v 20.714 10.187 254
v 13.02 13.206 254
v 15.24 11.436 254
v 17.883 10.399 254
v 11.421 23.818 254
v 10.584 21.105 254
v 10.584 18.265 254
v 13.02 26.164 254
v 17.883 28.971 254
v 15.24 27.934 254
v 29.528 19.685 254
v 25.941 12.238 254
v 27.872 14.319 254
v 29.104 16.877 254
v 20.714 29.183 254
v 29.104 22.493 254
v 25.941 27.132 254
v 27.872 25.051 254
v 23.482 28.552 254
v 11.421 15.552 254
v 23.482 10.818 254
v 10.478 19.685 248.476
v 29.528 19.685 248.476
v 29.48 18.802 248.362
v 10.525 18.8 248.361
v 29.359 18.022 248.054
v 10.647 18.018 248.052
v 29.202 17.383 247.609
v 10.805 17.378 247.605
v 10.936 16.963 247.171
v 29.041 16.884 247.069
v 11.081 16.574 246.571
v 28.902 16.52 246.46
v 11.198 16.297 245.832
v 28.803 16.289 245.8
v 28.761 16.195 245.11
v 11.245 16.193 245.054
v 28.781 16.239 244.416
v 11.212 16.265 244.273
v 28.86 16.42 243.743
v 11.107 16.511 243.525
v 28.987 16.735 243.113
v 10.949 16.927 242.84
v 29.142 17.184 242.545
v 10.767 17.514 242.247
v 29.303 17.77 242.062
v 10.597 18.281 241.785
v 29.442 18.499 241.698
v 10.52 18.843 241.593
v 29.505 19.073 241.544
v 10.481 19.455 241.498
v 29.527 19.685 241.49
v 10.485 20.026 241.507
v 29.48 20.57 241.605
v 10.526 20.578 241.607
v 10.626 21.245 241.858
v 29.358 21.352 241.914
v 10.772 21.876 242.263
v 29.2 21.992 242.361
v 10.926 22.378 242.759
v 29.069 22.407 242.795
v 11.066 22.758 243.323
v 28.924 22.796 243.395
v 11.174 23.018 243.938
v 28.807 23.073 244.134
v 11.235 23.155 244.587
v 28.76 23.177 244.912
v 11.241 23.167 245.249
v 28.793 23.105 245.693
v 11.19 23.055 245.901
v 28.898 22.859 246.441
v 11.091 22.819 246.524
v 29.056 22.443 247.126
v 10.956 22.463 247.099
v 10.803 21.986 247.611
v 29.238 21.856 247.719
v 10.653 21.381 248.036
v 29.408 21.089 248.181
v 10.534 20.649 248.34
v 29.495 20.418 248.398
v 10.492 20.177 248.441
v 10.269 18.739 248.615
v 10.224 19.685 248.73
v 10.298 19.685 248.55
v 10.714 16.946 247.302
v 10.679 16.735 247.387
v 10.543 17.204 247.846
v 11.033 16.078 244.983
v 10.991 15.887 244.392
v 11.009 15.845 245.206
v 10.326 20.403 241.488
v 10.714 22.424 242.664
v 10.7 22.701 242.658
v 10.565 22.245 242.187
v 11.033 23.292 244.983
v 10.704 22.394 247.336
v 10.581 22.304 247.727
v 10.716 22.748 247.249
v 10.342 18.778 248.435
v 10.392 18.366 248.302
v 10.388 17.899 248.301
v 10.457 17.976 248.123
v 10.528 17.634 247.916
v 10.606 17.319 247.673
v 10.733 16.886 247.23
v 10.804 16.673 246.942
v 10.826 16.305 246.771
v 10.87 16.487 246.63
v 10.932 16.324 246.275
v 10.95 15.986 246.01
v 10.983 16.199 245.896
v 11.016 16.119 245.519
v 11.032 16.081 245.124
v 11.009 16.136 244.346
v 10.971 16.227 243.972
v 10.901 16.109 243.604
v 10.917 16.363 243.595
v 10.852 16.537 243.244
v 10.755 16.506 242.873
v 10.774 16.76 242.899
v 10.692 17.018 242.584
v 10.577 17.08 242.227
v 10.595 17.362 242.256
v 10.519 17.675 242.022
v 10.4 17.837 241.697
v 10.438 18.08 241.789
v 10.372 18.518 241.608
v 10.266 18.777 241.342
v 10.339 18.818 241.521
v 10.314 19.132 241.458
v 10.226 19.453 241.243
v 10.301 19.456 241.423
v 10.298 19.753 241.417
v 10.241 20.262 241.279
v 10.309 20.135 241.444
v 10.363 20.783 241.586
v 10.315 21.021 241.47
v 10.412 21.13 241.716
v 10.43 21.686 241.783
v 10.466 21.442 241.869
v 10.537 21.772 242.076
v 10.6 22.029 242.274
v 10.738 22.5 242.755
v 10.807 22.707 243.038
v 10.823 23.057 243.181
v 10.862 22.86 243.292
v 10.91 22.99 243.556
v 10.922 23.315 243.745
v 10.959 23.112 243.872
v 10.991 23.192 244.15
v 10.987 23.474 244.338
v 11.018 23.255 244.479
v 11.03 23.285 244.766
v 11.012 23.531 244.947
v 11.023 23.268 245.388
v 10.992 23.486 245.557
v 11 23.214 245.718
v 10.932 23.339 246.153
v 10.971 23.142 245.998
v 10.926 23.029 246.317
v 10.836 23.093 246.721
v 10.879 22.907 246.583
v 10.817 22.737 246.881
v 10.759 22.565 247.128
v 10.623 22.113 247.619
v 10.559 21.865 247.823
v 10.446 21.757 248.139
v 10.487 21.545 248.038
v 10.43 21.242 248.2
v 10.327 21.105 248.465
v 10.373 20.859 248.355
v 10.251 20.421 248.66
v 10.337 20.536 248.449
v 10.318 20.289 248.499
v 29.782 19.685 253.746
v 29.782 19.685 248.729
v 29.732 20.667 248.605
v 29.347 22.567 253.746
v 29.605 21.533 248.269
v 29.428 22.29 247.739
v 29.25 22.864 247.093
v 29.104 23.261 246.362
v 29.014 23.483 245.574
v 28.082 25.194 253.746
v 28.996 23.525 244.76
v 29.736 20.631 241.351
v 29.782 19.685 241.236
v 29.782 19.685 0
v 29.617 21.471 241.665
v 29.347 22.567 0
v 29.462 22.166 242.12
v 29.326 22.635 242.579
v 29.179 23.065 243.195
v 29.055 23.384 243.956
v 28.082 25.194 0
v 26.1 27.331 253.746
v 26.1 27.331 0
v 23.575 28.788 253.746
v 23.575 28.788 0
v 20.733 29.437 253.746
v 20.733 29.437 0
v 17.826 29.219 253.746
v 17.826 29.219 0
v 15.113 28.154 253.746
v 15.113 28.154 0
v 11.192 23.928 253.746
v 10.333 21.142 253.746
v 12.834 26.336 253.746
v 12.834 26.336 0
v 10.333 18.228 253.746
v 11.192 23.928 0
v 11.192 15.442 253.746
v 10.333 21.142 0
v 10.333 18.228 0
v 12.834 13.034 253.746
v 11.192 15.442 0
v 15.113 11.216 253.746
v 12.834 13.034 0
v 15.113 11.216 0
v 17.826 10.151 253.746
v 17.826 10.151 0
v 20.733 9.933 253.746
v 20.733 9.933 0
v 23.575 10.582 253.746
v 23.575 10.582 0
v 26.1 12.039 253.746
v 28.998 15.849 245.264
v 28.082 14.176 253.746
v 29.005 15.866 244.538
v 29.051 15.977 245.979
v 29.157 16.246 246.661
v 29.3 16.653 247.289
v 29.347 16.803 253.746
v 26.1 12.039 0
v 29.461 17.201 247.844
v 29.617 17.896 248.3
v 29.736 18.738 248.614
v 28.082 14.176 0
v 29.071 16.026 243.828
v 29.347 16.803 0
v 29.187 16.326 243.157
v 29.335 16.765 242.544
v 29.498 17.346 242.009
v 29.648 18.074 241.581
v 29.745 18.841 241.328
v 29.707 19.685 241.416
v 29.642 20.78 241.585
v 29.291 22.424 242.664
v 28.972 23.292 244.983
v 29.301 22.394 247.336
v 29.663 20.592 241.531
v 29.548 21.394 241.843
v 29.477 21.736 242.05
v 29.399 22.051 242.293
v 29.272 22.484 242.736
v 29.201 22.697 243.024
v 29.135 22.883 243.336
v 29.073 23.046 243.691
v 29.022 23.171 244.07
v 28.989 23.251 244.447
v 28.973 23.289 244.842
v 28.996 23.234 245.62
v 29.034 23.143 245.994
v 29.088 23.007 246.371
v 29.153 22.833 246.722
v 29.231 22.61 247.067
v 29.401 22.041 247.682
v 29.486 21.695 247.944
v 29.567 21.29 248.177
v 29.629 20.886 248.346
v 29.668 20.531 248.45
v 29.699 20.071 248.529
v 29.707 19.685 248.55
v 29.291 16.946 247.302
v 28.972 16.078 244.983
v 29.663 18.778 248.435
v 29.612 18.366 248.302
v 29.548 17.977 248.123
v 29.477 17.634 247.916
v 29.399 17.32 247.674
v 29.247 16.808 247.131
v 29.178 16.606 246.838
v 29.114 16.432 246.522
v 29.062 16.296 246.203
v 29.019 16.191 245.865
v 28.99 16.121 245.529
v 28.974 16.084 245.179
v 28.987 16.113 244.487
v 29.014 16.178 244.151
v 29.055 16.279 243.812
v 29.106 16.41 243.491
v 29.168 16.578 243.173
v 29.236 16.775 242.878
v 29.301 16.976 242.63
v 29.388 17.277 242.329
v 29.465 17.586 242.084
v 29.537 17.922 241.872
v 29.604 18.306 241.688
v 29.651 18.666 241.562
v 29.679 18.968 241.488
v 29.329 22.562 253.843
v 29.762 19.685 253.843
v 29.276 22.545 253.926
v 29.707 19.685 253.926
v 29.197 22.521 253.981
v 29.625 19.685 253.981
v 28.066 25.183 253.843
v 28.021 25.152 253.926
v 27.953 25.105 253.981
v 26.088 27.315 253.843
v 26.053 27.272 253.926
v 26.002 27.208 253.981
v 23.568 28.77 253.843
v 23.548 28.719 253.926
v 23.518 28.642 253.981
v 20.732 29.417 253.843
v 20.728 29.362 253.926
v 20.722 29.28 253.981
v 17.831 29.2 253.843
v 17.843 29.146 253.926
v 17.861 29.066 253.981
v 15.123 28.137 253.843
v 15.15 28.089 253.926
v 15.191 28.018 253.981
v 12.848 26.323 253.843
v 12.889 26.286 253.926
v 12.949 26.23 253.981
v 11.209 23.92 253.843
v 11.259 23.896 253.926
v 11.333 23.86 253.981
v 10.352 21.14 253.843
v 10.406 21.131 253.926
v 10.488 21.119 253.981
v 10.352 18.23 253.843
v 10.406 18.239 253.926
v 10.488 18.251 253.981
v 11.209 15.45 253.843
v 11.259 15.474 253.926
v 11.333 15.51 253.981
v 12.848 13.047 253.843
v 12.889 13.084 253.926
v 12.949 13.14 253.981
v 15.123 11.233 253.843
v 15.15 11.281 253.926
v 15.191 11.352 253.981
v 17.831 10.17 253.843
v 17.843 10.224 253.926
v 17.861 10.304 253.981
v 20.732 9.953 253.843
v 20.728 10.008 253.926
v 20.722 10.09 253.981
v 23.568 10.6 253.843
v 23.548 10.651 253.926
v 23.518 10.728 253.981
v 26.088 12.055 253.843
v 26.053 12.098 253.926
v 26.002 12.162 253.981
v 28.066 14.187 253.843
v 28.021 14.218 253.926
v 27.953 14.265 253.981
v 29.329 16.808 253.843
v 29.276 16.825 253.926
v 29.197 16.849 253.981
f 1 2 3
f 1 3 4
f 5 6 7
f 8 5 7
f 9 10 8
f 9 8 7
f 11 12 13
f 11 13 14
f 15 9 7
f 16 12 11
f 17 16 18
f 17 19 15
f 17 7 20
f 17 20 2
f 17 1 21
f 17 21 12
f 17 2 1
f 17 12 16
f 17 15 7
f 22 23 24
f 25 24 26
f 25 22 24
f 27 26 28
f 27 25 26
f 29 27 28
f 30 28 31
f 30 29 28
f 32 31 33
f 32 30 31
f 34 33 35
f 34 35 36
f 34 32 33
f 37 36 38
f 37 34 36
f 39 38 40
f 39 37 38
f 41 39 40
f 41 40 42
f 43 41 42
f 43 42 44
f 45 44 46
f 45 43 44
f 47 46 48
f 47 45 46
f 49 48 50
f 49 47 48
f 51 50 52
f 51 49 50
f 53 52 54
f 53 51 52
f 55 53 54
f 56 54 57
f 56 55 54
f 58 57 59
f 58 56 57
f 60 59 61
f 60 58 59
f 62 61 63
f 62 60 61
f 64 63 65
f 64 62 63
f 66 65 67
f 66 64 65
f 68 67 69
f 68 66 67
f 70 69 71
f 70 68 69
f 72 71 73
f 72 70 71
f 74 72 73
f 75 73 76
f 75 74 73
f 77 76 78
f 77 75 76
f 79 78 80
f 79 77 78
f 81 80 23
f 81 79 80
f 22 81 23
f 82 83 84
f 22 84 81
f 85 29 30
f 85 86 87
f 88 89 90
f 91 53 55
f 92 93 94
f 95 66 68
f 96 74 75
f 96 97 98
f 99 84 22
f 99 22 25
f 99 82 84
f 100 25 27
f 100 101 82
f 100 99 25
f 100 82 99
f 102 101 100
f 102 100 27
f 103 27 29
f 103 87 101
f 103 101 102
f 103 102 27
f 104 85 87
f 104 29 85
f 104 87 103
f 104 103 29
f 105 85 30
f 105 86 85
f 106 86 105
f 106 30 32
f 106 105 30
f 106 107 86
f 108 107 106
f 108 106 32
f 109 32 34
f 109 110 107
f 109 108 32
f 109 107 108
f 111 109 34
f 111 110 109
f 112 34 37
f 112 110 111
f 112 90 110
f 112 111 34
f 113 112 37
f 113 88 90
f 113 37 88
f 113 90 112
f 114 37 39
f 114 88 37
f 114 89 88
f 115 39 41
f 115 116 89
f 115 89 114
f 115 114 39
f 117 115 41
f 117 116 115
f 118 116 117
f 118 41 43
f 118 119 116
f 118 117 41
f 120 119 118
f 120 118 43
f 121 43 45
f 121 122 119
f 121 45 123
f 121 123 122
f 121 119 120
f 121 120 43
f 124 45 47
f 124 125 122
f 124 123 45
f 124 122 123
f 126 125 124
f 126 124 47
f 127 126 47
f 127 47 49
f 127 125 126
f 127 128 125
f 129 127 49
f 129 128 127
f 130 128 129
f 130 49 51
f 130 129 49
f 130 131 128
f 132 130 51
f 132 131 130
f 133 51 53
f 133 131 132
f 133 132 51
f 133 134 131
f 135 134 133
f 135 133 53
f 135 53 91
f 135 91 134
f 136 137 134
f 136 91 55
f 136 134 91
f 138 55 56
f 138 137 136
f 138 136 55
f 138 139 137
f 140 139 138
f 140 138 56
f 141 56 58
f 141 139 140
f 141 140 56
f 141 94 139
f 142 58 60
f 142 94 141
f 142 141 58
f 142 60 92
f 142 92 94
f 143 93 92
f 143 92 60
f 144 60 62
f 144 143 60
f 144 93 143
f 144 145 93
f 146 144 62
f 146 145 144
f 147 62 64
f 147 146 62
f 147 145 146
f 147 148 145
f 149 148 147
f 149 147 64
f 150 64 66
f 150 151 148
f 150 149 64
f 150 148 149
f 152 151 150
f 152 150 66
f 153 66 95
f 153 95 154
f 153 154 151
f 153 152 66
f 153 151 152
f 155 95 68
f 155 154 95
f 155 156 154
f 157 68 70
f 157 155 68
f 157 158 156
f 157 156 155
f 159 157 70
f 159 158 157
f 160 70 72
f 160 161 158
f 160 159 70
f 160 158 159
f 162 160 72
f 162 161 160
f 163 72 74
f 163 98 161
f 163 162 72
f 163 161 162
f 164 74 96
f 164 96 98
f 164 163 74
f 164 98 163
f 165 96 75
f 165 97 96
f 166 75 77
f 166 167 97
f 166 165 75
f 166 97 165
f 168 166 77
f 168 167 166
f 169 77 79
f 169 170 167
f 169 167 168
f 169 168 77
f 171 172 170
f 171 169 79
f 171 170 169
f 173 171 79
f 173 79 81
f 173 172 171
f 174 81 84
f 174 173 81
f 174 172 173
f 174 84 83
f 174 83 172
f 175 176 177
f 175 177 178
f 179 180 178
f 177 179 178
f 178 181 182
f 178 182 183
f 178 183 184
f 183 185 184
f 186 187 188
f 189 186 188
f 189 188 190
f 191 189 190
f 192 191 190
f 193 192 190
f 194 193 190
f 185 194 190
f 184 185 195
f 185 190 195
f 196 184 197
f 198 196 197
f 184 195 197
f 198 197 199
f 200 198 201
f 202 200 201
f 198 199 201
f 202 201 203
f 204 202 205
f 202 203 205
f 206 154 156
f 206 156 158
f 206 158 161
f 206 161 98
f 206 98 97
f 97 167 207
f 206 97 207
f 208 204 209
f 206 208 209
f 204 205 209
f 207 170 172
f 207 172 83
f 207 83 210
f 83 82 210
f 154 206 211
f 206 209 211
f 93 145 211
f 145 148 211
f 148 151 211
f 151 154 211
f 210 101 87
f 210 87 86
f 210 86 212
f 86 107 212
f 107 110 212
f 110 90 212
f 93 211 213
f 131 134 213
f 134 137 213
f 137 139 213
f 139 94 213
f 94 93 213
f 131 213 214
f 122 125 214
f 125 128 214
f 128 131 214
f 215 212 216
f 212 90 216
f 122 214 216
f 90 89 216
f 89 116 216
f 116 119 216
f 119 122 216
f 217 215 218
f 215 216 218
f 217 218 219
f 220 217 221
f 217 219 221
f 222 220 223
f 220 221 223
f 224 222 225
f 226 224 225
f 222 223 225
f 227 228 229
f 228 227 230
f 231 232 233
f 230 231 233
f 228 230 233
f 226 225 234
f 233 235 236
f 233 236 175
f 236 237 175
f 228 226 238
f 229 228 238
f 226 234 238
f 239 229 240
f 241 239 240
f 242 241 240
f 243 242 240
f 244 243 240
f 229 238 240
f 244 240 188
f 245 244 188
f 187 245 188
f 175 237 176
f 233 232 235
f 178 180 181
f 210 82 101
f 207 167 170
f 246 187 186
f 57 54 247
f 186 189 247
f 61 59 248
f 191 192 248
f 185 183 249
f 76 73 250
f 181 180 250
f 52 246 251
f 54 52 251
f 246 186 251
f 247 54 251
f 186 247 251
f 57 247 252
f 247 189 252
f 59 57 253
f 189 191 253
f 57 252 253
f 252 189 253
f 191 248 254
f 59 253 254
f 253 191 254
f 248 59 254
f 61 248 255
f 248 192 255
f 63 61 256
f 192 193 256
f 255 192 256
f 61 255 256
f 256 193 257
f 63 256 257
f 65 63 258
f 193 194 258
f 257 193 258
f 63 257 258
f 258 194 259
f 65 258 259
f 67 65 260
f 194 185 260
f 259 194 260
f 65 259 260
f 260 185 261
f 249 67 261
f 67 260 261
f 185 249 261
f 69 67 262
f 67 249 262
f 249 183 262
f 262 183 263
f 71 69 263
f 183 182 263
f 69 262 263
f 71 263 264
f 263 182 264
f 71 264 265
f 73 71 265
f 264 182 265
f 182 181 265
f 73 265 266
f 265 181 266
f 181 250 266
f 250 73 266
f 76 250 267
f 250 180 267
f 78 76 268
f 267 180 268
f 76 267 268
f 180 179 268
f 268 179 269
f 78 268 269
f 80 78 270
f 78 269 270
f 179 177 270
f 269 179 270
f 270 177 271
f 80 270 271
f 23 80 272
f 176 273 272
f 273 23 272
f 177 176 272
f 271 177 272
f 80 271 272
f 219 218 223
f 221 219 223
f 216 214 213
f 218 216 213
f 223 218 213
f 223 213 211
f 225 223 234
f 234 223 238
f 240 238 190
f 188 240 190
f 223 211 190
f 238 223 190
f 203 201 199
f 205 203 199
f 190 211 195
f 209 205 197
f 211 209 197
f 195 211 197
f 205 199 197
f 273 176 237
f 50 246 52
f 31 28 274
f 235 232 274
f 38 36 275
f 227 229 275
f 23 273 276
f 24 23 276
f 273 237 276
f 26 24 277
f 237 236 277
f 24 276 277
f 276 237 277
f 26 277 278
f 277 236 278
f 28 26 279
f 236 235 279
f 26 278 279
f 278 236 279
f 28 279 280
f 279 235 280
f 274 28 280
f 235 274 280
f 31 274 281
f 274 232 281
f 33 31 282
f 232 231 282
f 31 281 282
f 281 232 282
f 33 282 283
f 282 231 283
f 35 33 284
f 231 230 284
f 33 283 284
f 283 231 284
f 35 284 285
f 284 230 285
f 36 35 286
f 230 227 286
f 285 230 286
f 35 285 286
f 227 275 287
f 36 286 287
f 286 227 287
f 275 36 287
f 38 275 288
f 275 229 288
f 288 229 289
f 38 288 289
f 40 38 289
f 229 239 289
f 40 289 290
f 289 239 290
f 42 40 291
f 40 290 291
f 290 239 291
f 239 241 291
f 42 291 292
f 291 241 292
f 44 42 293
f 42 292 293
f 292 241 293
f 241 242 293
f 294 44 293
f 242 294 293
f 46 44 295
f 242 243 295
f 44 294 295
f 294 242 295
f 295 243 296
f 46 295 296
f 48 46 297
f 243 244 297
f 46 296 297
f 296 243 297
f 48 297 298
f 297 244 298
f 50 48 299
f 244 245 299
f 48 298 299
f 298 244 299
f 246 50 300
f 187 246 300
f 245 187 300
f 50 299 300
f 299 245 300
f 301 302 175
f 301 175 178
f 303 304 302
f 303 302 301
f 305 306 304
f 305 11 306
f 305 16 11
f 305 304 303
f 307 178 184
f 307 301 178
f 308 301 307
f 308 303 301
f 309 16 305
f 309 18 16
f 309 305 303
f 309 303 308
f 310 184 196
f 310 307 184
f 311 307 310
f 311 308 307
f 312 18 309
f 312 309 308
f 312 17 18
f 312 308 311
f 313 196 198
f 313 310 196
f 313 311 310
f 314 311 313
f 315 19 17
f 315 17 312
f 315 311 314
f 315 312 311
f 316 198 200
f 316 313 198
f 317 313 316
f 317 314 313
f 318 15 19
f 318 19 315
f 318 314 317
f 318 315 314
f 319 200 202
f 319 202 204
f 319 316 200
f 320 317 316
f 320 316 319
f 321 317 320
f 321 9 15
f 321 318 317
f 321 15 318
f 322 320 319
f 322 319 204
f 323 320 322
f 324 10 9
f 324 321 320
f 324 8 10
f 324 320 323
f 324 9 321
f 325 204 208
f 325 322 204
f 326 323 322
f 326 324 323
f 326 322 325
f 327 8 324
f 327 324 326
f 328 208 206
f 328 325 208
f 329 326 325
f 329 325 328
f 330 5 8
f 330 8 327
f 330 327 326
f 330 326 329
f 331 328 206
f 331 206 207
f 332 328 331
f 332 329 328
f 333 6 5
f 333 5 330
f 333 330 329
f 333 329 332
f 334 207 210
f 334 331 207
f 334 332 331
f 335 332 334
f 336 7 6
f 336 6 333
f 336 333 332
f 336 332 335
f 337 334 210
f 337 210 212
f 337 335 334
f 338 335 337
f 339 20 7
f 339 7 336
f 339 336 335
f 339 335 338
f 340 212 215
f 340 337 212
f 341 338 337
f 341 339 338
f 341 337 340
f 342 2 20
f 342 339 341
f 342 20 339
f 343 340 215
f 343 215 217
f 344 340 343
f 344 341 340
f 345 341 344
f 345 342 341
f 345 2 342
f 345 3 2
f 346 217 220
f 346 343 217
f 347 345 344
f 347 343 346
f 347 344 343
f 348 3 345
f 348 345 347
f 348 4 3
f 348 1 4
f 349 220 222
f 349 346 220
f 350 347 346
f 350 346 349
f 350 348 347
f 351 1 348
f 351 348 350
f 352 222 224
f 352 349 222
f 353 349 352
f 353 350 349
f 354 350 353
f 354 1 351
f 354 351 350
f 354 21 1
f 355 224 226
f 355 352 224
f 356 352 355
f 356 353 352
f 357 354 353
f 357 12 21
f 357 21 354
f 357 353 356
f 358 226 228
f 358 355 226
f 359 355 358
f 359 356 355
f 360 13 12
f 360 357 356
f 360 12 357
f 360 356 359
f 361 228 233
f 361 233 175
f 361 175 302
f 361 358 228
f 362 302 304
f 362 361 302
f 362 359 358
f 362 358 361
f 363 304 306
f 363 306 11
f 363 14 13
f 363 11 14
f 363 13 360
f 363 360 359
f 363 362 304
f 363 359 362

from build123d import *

# Parameters (mm, degrees)
SKETCH1_R           = 9.779
BOSS_EXTRUDE1_DEPTH = 254
SKETCH2_R           = 3.4925
CUT_EXTRUDE1_DEPTH  = 258.43167062
FILLET1_R           = 0.254
FILLET2_R           = 0.254


with BuildPart() as part:
    # Sketch1 → Boss-Extrude1 (new body)
    with BuildSketch(Plane.XY):
        with Locations((20.0025, 19.685)):
            Circle(SKETCH1_R)
    extrude(amount=BOSS_EXTRUDE1_DEPTH)

    # Sketch2 → Cut-Extrude1 (cut, through all)
    with BuildSketch(Plane(origin=(0, 0, 0), x_dir=(0, 0, -1), z_dir=(1, 0, 0))):
        with Locations(Location((-244.983, 19.685, 0), (0, 0, 180))):
            Circle(SKETCH2_R)
    extrude(amount=CUT_EXTRUDE1_DEPTH, mode=Mode.SUBTRACT)

    # Fillet1
    fillet1_edges = [part.edges().sort_by_distance(p)[0] for p in [
        (29.136572736, 23.1775, 244.983),
        (10.2235, 19.685, 241.490499999),
    ]]
    fillet(fillet1_edges, radius=FILLET1_R)

    # Fillet2
    fillet2_edges = [part.edges().sort_by_distance(p)[0] for p in [
        (10.2235, 19.685, 254),
    ]]
    fillet(fillet2_edges, radius=FILLET2_R)


solid = part.part
